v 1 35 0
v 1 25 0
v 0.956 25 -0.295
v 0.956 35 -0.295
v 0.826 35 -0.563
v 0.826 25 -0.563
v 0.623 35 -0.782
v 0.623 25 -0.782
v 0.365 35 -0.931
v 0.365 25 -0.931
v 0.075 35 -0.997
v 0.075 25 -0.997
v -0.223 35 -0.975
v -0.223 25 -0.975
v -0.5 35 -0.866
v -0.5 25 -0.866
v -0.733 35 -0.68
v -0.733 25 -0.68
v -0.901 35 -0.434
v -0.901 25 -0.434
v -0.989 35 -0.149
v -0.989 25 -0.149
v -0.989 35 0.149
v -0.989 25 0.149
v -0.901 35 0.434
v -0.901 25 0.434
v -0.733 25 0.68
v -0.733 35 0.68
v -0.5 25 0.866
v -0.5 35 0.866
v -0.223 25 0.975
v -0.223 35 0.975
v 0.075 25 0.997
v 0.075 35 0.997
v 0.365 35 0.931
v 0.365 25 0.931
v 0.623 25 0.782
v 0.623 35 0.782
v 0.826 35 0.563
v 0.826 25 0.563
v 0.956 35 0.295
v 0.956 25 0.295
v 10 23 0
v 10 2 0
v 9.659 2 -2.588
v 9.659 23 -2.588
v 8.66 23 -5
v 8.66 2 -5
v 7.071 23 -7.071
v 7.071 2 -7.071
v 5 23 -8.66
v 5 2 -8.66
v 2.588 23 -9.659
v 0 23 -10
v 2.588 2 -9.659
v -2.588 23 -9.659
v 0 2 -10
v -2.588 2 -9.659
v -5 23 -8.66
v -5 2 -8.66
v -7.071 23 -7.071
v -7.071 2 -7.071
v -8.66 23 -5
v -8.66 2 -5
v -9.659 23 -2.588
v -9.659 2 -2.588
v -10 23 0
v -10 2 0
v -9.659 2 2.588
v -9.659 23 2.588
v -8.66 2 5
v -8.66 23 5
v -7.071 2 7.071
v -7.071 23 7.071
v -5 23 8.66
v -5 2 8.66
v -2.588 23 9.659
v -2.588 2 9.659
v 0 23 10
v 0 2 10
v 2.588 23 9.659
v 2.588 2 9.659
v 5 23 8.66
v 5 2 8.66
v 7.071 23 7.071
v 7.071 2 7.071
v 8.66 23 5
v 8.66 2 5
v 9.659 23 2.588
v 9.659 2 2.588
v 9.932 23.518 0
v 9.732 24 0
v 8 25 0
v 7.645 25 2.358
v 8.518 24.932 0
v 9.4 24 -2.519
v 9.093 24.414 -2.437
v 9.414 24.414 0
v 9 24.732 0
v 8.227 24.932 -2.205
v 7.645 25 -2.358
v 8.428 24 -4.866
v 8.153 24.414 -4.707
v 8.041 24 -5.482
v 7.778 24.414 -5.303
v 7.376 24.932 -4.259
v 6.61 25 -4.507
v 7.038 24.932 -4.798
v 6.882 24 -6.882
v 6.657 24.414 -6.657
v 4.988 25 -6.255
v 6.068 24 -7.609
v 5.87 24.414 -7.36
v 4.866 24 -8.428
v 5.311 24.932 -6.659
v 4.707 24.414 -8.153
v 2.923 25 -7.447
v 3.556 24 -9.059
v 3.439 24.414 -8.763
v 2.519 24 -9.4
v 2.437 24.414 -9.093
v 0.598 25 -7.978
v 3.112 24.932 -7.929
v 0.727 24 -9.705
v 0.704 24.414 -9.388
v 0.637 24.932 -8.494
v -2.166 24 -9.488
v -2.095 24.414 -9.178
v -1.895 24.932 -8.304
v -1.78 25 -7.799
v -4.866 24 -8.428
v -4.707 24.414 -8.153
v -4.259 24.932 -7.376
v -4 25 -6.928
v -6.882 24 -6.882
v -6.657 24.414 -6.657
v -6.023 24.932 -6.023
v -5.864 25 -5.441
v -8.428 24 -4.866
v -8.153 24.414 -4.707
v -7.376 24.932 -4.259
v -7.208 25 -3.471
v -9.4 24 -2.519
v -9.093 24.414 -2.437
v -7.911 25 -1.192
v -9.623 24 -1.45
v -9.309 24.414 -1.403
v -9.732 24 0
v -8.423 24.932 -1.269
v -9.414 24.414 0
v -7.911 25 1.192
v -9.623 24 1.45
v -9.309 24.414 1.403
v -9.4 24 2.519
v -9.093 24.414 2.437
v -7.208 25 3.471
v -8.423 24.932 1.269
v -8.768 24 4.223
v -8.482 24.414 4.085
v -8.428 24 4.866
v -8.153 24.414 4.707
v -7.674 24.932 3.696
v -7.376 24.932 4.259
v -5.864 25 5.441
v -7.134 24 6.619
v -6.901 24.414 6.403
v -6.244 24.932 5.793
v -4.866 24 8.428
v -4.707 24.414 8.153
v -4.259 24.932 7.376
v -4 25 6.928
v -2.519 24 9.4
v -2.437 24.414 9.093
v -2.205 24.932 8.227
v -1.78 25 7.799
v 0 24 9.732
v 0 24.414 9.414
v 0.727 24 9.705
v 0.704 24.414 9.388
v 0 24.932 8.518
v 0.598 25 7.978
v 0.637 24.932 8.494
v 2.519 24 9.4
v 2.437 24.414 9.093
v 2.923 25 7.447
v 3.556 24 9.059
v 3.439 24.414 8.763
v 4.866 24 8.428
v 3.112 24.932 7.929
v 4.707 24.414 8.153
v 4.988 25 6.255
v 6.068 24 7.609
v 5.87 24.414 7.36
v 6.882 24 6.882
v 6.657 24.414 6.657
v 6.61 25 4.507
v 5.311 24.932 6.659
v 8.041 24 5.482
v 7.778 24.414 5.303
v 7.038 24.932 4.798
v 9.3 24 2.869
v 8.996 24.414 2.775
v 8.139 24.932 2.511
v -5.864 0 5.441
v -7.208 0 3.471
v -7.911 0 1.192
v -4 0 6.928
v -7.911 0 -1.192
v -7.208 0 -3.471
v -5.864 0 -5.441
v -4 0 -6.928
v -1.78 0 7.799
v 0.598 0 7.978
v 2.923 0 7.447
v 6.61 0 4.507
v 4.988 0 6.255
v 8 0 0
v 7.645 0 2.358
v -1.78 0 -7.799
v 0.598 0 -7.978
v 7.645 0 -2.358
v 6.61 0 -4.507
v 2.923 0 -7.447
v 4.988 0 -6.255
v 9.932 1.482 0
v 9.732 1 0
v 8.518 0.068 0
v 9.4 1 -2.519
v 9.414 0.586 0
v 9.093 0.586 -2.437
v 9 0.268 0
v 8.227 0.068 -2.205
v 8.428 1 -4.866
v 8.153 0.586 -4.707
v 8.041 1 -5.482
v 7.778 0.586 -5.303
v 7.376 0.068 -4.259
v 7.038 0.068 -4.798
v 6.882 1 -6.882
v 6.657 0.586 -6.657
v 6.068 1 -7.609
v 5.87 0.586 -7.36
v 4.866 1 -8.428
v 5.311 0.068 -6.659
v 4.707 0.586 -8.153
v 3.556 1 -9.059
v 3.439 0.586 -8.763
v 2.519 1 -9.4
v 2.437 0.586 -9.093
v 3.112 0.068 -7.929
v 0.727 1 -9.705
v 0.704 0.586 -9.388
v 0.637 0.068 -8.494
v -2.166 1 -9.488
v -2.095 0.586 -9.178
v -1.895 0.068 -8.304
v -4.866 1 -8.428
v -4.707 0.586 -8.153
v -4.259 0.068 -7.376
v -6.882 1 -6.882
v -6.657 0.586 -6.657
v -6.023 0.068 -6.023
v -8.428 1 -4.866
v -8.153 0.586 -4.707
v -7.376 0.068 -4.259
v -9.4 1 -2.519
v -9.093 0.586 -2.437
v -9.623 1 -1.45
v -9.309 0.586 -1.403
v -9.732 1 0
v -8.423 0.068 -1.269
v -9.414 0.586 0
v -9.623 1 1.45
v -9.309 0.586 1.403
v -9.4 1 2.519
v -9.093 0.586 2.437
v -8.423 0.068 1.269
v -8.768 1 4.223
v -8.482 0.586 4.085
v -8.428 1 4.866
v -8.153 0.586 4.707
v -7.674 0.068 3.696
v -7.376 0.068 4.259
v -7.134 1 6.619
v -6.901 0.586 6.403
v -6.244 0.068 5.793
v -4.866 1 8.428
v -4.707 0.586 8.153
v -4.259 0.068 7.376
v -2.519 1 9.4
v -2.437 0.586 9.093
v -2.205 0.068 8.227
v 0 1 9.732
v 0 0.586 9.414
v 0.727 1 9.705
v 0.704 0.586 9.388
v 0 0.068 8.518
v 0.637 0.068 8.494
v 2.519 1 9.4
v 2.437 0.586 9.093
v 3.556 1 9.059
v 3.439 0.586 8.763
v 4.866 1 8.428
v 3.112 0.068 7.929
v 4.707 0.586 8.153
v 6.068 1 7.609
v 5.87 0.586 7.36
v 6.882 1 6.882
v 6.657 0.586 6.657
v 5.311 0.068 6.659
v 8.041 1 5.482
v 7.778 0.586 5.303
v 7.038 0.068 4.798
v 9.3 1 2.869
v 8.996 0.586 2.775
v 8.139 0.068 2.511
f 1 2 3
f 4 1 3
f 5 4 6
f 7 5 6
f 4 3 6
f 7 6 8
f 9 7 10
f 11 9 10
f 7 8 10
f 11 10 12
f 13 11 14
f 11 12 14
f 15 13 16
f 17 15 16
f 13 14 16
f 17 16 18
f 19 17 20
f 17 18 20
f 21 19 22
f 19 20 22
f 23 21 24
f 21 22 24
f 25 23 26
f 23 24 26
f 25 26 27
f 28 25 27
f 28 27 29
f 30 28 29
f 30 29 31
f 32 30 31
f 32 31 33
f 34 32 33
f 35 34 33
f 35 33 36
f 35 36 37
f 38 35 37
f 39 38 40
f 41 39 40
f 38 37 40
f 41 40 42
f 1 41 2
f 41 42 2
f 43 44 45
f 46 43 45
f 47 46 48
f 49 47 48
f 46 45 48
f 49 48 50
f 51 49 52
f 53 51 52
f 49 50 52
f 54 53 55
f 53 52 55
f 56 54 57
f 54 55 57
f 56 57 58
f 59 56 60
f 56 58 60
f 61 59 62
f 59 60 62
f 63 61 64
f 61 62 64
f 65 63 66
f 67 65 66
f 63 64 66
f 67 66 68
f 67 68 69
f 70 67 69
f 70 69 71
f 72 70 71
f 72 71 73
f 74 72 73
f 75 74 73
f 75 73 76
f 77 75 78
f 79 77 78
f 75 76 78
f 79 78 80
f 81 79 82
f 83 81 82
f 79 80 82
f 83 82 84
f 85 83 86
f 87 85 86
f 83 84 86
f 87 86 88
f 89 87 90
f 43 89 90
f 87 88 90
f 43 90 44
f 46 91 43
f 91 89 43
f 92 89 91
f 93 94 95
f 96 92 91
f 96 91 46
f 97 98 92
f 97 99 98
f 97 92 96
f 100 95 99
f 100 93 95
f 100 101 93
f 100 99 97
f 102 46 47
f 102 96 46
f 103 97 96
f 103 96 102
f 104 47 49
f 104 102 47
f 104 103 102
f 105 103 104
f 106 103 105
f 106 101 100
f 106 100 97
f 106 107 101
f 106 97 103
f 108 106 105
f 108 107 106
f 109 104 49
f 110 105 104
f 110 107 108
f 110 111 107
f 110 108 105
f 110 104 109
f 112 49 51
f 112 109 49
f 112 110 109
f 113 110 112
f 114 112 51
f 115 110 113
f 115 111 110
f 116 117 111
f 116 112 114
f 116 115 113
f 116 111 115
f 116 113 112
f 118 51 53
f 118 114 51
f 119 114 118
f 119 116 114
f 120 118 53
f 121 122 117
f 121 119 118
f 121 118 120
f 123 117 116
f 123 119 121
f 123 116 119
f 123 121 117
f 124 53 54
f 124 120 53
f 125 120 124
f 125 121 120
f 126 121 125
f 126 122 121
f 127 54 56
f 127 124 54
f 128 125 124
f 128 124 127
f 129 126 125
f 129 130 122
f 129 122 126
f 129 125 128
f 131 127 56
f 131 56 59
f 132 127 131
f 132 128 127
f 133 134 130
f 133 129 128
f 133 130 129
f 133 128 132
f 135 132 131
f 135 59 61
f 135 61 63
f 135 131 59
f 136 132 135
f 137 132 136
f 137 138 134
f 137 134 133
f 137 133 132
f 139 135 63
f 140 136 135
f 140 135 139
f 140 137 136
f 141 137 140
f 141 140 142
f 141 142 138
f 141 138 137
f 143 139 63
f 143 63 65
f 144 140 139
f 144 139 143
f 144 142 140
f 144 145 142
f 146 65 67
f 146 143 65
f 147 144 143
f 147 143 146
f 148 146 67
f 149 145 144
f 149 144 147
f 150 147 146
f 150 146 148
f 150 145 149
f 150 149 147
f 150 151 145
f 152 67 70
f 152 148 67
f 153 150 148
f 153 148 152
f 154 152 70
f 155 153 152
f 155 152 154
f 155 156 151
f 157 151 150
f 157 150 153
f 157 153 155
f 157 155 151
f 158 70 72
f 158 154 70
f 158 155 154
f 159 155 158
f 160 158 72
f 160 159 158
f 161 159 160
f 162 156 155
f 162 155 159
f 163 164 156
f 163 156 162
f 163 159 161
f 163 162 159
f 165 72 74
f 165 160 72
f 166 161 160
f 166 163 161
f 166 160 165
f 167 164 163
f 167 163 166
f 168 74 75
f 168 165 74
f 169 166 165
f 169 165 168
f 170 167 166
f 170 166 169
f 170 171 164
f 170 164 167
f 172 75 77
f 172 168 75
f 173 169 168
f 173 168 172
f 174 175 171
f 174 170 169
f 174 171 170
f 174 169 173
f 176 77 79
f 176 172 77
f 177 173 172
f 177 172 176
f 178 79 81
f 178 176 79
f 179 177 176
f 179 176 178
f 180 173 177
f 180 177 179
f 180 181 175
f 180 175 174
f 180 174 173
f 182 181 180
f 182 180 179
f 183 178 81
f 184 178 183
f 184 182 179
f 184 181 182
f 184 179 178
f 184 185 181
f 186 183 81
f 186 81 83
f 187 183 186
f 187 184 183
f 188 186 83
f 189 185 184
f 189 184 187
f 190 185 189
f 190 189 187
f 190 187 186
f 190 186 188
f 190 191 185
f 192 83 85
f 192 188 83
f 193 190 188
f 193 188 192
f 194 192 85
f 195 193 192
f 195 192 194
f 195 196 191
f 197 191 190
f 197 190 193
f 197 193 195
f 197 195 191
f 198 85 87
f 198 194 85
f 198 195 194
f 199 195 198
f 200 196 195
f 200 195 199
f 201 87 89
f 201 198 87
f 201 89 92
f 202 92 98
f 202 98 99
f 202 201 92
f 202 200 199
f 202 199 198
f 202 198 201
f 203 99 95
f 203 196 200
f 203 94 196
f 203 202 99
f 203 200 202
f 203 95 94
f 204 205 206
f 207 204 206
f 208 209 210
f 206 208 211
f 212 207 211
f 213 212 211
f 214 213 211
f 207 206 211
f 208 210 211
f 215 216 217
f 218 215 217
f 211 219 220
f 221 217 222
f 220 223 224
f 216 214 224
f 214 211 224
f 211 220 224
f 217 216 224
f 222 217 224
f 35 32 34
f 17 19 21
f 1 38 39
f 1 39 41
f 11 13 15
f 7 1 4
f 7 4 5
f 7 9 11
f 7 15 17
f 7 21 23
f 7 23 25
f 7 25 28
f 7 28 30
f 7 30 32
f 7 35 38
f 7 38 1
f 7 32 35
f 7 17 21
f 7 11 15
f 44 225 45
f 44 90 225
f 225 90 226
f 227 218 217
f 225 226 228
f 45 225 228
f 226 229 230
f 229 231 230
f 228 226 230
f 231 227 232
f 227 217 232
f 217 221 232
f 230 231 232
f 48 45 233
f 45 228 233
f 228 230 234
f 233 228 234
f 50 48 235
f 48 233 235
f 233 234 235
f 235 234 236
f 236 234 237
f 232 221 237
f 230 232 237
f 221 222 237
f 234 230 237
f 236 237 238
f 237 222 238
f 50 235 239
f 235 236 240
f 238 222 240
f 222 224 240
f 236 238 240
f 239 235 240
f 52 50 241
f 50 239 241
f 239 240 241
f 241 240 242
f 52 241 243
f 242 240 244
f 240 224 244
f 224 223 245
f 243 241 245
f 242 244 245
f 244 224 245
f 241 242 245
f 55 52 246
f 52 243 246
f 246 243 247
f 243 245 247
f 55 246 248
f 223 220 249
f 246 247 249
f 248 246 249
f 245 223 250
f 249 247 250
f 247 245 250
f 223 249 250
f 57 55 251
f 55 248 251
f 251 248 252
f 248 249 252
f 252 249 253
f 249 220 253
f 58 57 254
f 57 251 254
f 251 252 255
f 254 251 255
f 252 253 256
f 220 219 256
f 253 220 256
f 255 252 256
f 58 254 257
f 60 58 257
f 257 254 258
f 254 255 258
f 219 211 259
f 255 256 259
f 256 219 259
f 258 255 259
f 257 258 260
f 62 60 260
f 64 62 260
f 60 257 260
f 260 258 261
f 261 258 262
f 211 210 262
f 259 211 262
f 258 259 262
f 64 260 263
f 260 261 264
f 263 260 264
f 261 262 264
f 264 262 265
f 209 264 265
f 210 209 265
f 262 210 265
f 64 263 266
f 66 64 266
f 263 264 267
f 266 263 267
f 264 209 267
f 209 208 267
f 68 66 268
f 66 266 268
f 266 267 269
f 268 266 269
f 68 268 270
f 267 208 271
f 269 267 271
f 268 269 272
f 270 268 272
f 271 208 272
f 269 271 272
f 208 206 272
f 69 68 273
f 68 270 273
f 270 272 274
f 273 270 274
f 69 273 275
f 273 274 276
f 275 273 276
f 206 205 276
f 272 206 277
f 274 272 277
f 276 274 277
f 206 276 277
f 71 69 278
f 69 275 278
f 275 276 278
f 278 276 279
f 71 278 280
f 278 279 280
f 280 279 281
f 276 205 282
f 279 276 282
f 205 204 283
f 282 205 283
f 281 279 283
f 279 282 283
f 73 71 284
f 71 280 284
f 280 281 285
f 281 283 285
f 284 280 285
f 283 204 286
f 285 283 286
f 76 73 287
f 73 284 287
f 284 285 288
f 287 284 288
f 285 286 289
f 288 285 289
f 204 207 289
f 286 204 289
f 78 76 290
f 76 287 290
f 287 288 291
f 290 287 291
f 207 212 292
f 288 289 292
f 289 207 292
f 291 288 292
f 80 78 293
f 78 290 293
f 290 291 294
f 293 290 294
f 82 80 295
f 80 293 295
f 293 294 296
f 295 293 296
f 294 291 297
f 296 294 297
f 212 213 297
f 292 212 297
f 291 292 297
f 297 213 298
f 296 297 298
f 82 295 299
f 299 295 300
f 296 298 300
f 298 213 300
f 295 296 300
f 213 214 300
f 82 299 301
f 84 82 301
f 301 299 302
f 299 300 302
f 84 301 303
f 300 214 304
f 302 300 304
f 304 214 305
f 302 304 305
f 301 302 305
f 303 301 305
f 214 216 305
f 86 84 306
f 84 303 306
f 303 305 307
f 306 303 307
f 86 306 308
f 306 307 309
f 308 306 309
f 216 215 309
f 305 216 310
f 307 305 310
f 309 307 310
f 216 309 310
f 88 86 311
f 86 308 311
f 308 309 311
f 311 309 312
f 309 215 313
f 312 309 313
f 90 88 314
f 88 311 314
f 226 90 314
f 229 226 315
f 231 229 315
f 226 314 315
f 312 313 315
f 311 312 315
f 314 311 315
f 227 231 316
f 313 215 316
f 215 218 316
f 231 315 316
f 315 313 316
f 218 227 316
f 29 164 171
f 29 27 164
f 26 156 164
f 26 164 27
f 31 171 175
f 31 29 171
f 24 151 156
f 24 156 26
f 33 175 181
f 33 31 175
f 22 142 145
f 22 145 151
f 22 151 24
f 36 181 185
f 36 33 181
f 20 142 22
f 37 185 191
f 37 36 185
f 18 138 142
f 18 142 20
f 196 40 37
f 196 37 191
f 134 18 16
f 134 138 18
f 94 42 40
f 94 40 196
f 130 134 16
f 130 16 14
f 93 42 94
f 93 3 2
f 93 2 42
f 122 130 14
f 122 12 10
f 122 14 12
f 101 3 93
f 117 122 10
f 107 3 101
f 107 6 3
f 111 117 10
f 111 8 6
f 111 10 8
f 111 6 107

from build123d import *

# Parameters (mm, degrees)
SKETCH1_R           = 10
BOSS_EXTRUDE1_DEPTH = 25
SKETCH2_R           = 1
BOSS_EXTRUDE2_DEPTH = 10
FILLET1_R           = 2


with BuildPart() as part:
    # Sketch1 → Boss-Extrude1 (new body)
    with BuildSketch(Plane(origin=(0, 0, 0), x_dir=(1, 0, 0), z_dir=(0, 1, 0))):
        Circle(SKETCH1_R)
    extrude(amount=BOSS_EXTRUDE1_DEPTH)

    # Sketch2 → Boss-Extrude2 (add)
    with BuildSketch(Plane(origin=(0, 25, 0), x_dir=(1, 0, 0), z_dir=(0, 1, 0))):
        Circle(SKETCH2_R)
    extrude(amount=BOSS_EXTRUDE2_DEPTH)

    # Fillet1
    fillet1_edges = [part.edges().sort_by_distance(p)[0] for p in [
        (-10, 0, 0),
        (-10, 25, 0),
    ]]
    fillet(fillet1_edges, radius=FILLET1_R)


solid = part.part
